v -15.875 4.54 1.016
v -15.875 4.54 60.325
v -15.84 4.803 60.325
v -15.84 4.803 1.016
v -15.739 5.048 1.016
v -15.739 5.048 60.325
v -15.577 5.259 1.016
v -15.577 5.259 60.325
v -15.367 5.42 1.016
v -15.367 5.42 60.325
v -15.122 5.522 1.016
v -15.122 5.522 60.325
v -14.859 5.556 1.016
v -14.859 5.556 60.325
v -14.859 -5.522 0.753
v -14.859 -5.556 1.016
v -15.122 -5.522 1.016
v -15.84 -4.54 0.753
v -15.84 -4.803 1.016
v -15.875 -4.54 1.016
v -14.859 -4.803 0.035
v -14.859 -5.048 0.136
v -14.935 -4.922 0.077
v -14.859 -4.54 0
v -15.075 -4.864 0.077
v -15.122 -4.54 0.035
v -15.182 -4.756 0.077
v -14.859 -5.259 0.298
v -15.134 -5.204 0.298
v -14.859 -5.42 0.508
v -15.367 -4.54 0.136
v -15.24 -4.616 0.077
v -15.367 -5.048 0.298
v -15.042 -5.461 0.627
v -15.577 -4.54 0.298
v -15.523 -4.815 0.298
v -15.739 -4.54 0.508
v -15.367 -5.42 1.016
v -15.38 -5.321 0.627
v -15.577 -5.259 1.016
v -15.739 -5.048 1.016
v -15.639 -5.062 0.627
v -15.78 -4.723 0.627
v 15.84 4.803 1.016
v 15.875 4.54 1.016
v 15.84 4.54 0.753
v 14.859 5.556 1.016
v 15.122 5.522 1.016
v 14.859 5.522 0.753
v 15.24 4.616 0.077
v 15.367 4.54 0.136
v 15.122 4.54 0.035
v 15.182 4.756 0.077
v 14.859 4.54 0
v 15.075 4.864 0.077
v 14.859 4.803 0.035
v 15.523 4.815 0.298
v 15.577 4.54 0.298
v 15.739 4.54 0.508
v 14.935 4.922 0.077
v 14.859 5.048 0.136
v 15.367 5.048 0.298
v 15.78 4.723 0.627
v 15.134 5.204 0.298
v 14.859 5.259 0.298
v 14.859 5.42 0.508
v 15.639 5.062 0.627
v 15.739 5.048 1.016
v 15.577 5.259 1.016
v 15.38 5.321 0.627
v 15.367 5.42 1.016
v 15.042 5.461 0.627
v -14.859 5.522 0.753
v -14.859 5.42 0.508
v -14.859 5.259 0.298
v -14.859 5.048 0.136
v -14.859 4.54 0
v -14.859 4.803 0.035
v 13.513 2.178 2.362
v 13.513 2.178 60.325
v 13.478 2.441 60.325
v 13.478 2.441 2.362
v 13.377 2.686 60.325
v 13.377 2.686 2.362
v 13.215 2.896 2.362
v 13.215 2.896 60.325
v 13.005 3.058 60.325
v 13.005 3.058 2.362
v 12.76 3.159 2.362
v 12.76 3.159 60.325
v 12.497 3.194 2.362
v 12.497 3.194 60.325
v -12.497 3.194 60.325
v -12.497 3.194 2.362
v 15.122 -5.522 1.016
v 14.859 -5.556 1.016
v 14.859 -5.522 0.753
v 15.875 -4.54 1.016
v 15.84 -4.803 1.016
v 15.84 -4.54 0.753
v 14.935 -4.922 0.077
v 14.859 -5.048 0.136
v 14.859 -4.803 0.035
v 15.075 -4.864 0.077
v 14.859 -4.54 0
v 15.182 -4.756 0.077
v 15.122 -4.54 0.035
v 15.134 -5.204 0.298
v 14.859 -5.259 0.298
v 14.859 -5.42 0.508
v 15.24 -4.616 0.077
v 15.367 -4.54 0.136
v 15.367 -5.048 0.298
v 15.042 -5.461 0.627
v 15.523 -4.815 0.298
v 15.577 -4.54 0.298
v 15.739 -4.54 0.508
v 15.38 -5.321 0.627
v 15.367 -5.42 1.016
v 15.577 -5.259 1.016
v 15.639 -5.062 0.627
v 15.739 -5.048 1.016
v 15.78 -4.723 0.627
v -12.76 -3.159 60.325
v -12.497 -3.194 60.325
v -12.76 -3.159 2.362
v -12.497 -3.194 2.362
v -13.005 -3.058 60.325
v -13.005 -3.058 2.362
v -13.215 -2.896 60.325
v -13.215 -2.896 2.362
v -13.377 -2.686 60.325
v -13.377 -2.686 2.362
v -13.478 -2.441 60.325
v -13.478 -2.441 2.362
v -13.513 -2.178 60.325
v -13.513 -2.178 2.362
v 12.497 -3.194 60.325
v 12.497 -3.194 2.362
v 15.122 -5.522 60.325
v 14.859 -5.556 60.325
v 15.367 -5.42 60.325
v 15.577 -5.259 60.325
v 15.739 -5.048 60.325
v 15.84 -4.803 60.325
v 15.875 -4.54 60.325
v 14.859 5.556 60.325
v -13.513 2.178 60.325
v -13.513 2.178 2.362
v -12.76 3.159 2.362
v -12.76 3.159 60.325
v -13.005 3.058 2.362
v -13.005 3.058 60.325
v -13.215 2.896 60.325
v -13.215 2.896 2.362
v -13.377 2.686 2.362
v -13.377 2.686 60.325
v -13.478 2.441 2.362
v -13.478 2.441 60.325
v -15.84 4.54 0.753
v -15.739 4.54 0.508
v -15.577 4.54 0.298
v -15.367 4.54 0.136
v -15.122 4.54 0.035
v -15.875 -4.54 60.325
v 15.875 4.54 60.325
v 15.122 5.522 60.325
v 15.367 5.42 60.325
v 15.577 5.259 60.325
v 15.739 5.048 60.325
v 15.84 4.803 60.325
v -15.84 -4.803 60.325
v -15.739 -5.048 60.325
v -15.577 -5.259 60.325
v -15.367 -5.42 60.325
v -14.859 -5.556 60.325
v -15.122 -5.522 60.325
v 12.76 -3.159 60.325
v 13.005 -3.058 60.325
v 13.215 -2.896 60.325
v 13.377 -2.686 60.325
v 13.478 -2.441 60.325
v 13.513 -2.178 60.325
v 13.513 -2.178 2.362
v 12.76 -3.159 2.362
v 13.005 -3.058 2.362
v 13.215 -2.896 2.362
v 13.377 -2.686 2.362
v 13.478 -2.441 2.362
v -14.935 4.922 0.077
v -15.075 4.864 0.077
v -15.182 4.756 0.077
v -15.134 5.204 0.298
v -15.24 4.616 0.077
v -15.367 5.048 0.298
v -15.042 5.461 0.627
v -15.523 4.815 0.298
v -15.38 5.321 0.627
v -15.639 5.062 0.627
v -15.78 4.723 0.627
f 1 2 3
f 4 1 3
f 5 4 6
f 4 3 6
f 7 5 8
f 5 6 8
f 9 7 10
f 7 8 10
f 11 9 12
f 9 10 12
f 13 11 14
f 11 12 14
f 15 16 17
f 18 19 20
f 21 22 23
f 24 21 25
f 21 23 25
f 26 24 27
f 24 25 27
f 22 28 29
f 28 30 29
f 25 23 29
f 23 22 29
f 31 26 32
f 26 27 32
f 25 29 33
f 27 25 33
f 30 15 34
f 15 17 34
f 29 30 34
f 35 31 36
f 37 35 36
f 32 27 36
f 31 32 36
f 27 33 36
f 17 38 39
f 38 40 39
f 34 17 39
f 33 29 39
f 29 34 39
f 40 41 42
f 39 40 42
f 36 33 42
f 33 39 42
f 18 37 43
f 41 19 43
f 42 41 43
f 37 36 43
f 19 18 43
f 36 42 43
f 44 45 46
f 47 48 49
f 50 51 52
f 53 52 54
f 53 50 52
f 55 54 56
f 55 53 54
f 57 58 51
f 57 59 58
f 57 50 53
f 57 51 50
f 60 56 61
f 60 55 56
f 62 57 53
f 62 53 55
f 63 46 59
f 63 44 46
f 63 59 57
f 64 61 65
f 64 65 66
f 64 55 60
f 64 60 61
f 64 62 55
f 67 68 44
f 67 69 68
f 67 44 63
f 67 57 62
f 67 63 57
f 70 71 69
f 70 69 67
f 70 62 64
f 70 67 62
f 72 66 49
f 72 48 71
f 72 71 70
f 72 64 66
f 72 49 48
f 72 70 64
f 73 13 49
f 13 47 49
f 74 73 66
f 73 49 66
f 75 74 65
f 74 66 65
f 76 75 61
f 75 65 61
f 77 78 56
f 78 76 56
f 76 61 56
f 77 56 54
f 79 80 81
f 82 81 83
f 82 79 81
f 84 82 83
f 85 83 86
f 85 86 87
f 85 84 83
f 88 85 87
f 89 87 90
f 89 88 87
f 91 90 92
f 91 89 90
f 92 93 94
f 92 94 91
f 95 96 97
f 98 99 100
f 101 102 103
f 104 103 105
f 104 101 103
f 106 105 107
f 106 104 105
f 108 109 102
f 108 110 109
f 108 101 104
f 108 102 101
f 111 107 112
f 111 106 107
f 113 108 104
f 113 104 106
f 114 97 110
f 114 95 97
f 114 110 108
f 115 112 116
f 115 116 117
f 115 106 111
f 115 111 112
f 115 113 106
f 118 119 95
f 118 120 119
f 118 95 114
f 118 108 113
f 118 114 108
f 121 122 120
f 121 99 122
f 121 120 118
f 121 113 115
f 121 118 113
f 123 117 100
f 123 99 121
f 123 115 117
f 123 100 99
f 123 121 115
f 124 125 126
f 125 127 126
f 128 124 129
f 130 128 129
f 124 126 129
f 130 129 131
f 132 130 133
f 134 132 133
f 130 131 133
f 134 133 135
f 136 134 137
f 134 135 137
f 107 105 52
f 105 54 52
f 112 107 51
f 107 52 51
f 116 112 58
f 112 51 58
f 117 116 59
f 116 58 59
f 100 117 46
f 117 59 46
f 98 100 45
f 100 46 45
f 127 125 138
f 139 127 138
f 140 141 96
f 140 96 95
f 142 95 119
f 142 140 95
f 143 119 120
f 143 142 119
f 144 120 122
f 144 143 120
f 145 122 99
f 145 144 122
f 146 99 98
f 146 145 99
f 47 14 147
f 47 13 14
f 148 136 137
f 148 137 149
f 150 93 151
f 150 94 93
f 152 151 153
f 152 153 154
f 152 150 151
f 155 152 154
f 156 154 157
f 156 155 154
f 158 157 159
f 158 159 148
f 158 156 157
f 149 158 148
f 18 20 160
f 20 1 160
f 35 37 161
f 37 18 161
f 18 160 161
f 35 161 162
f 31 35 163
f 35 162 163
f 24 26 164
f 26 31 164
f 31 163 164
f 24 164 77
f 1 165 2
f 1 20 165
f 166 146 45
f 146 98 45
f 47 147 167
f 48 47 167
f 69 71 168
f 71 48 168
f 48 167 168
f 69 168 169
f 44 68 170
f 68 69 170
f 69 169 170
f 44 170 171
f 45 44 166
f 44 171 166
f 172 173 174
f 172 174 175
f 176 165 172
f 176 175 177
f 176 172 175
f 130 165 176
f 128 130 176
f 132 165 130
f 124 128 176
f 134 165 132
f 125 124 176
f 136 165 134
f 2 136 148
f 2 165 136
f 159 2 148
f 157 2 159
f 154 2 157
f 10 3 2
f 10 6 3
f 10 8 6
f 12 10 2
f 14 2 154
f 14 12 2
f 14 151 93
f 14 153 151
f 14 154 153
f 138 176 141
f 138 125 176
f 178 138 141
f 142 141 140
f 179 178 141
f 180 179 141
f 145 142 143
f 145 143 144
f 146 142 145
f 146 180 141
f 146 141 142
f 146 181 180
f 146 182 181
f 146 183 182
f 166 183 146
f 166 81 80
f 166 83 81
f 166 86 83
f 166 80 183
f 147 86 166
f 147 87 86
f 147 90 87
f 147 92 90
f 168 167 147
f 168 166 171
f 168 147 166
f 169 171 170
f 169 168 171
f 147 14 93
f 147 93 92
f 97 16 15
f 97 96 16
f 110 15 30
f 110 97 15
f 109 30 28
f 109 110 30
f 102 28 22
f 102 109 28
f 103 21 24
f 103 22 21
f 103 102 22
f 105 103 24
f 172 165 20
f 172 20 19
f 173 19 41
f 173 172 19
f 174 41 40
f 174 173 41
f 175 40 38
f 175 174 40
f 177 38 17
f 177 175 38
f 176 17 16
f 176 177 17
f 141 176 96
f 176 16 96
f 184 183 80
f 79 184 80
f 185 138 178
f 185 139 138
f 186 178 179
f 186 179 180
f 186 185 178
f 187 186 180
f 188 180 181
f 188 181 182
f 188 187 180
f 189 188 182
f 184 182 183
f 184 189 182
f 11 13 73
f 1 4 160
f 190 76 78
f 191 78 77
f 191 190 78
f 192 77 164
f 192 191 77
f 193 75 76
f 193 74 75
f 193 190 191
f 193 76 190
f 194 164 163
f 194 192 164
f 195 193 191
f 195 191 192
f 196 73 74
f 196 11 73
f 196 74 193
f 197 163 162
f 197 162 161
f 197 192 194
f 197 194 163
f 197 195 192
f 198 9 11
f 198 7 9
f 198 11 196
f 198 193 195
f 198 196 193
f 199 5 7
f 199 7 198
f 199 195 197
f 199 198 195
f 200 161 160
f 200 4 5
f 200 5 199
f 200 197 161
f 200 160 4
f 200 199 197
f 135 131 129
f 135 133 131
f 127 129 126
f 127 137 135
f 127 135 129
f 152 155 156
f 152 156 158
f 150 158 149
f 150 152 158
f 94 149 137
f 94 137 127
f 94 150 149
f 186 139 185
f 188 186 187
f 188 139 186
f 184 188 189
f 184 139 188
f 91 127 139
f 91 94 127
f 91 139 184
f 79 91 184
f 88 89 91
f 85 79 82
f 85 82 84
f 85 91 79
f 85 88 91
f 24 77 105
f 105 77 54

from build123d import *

# Parameters (mm, degrees)
F0_W     = 31.75
F0_H     = 11.1125
F1_DEPTH = 60.325
F2_W     = 27.0256
F2_H     = 6.3881
F3_DEPTH = 57.9628
F4_R     = 1.016


with BuildPart() as f1:
    # F0 (on Top) → F1 (new body)
    with BuildSketch(Plane.XY):
        Rectangle(F0_W, F0_H)
    extrude(amount=F1_DEPTH)

    # F2 (on face) → F3 (cut)
    with BuildSketch(Plane.XY.offset(60.325)):
        Rectangle(F2_W, F2_H)
    extrude(amount=-F3_DEPTH, mode=Mode.SUBTRACT)

    # F4
    f4_edges = [f1.edges().sort_by_distance(p)[0] for p in [
        (-15.875, -5.55625, 30.1625),
        (15.875, -5.55625, 30.1625),
        (15.875, 5.55625, 30.1625),
        (-15.875, 5.55625, 30.1625),
        (13.5128, 3.19405, 31.3436),
        (-13.5128, 3.19405, 31.3436),
        (-13.5128, -3.19405, 31.3436),
        (13.5128, -3.19405, 31.3436),
        (0, -5.55625, 0),
        (15.875, 0, 0),
        (0, 5.55625, 0),
        (-15.875, 0, 0),
    ]]
    fillet(f4_edges, radius=F4_R)


solid = f1.part
